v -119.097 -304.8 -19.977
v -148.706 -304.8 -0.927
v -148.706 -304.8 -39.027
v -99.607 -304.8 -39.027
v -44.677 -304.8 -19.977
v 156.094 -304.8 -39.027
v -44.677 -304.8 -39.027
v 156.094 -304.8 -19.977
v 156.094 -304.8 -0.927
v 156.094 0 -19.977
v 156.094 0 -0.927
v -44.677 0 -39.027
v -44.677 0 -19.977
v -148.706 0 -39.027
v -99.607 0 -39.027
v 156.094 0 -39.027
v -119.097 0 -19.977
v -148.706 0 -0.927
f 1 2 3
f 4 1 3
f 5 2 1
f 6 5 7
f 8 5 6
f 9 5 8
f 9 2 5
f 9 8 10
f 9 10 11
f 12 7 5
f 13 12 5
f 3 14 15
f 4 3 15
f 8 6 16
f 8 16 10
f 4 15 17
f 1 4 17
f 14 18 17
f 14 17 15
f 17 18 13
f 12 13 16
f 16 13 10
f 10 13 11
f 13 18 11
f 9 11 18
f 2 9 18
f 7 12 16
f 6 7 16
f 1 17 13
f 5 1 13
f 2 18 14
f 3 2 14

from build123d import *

# Parameters (mm, degrees)
F0_W     = 200.770747
F0_H     = 19.05
F1_DEPTH = 304.8


with BuildPart() as f1:
    # F0 (on Front) → F1 (new body)
    with BuildSketch(Plane.XZ):
        Polygon((-119.097248, -19.97675), (-148.705989, -19.97675), (-148.705989, -39.02675), (-99.606508, -39.02675), align=None)
        Polygon((156.094011, -0.92675), (-148.705989, -0.92675), (-148.705989, -19.97675), (-119.097248, -19.97675), (-44.676736, -19.97675), (156.094011, -19.97675), align=None)
        with Locations((55.708637, -29.50175)):
            Rectangle(F0_W, F0_H)
    extrude(amount=F1_DEPTH)


solid = f1.part
